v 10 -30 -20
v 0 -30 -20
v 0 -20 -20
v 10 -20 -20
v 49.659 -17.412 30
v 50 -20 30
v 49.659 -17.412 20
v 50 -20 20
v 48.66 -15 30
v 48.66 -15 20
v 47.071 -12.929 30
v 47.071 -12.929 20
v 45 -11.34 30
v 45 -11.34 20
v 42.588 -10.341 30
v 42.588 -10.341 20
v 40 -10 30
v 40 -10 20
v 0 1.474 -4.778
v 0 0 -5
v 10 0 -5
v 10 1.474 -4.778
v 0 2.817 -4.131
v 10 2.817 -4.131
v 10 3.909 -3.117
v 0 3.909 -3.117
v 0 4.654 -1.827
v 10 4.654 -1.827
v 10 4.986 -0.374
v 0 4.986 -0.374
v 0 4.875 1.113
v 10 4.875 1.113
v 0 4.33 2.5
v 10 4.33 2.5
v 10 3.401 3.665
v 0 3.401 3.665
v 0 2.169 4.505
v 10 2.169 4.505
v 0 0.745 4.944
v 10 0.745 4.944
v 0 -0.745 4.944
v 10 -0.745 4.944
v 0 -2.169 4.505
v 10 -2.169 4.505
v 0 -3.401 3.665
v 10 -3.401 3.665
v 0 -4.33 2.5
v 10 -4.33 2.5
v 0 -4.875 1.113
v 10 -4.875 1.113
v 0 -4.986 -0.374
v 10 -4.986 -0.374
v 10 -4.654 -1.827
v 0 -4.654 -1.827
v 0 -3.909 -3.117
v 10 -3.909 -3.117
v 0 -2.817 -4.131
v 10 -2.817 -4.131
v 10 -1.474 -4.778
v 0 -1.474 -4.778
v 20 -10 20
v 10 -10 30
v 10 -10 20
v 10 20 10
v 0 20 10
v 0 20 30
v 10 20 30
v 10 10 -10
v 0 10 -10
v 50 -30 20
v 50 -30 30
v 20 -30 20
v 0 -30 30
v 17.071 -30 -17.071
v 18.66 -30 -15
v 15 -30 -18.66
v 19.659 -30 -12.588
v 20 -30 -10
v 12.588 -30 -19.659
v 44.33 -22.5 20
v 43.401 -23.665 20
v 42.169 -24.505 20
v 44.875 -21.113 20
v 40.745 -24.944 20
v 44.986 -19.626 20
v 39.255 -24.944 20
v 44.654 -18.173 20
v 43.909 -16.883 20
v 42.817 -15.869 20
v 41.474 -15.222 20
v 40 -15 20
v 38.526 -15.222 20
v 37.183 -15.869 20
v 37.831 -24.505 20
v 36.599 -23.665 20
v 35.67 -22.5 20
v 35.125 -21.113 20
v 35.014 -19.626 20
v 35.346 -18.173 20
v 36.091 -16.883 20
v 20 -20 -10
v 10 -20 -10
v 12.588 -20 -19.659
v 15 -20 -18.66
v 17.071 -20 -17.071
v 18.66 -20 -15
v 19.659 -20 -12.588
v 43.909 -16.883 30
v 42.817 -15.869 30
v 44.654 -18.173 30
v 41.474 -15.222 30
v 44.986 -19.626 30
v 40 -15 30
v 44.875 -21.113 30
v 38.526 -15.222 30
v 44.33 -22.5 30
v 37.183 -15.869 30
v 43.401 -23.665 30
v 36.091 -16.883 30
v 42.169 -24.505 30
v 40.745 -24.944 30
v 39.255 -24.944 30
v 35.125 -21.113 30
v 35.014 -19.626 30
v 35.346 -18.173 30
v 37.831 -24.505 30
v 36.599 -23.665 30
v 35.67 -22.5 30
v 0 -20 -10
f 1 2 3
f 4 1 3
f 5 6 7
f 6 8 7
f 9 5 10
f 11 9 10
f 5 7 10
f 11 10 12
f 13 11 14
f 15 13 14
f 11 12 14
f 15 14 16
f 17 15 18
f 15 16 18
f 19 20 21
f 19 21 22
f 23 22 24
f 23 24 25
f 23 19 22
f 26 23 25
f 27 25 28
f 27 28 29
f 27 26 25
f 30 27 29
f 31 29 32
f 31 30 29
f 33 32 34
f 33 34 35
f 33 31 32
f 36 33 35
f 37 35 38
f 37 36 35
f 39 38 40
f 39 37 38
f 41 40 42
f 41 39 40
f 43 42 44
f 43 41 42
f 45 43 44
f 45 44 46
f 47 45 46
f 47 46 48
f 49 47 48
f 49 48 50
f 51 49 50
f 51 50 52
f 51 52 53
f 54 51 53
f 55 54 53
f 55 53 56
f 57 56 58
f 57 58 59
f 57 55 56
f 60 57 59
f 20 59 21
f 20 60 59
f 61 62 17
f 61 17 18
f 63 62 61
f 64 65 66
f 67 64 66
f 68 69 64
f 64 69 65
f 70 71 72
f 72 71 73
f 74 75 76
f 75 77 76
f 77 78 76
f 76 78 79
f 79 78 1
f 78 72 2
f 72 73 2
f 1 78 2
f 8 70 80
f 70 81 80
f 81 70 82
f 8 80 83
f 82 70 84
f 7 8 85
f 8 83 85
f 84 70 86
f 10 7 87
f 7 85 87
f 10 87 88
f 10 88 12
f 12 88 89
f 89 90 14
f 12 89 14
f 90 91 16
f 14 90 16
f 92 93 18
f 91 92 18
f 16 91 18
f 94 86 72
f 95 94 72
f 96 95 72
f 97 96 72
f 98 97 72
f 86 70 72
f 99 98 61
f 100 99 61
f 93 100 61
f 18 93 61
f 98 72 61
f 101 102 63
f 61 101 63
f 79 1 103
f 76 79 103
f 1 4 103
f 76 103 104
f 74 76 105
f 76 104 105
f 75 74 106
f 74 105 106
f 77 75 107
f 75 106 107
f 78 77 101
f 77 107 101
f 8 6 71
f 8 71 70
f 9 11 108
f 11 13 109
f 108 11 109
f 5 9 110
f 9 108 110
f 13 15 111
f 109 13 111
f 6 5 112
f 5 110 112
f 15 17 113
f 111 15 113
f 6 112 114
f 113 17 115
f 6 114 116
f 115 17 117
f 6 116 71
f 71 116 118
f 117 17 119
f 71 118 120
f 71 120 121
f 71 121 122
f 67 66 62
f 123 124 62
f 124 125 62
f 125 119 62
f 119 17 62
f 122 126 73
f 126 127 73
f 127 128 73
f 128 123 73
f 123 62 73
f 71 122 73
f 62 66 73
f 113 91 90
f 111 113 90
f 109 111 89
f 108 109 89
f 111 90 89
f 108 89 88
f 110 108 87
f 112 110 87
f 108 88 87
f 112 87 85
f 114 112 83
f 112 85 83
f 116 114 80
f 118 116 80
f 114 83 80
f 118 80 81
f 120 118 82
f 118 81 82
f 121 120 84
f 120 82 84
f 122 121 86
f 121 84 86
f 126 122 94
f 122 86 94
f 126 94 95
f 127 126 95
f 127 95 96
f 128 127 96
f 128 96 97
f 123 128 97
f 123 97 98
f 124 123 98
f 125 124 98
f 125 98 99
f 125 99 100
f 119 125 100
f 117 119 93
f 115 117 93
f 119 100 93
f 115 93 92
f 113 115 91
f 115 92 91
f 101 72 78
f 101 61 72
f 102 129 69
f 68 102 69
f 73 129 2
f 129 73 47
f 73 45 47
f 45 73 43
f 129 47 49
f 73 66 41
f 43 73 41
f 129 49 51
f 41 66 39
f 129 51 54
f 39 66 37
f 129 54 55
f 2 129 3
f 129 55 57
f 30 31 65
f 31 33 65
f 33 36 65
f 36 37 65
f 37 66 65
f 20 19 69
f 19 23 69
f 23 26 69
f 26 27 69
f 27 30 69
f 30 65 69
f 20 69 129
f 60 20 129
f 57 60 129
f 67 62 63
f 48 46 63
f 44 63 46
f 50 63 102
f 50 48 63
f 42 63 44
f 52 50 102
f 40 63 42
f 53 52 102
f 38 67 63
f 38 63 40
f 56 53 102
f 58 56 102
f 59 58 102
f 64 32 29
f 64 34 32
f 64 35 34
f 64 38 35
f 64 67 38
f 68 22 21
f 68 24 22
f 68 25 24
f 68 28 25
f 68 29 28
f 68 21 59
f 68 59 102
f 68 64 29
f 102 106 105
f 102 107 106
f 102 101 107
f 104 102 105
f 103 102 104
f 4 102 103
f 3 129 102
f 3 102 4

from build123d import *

# Parameters (mm, degrees)
SKETCH1_W           = 10
SKETCH1_H           = 20
BOSS_EXTRUDE1_DEPTH = 50
BOSS_EXTRUDE2_DEPTH = 20
SKETCH1_4_R         = 5
BOSS_EXTRUDE3_DEPTH = 10
FILLET1_R           = 10
SKETCH2_R           = 5
CUT_EXTRUDE1_DEPTH  = 10


with BuildPart() as part:
    # Sketch1 → Boss-Extrude1 (new body)
    with BuildSketch(Plane(origin=(0, 0, 0), x_dir=(0, 0, -1), z_dir=(1, 0, 0))):
        with Locations((-25, -20)):
            Rectangle(SKETCH1_W, SKETCH1_H)
    extrude(amount=BOSS_EXTRUDE1_DEPTH)

    # Sketch1<3> → Boss-Extrude2 (add)
    with BuildSketch(Plane(origin=(0, 0, 0), x_dir=(0, 0, -1), z_dir=(1, 0, 0))):
        Polygon((10, -20), (-20, -10), (-20, -30), (20, -30), (20, -20), align=None)
    extrude(amount=BOSS_EXTRUDE2_DEPTH)

    # Sketch1<4> → Boss-Extrude3 (add)
    with BuildSketch(Plane(origin=(0, 0, 0), x_dir=(0, 0, -1), z_dir=(1, 0, 0))):
        Polygon((-10, 20), (-30, 20), (-30, -10), (-20, -10), (10, -20), (10, 10), align=None)
        Circle(SKETCH1_4_R, mode=Mode.SUBTRACT)
    extrude(amount=BOSS_EXTRUDE3_DEPTH)

    # Fillet1
    fillet1_edges = [part.edges().sort_by_distance(p)[0] for p in [
        (50, -10, 25),
        (20, -25, -20),
    ]]
    fillet(fillet1_edges, radius=FILLET1_R)

    # Sketch2 → Cut-Extrude1 (cut)
    with BuildSketch(Plane(origin=(0, 0, 20), x_dir=(-1, 0, 0), z_dir=(0, 0, -1))):
        with Locations((-40, -20)):
            Circle(SKETCH2_R)
    extrude(amount=-CUT_EXTRUDE1_DEPTH, mode=Mode.SUBTRACT)


solid = part.part
